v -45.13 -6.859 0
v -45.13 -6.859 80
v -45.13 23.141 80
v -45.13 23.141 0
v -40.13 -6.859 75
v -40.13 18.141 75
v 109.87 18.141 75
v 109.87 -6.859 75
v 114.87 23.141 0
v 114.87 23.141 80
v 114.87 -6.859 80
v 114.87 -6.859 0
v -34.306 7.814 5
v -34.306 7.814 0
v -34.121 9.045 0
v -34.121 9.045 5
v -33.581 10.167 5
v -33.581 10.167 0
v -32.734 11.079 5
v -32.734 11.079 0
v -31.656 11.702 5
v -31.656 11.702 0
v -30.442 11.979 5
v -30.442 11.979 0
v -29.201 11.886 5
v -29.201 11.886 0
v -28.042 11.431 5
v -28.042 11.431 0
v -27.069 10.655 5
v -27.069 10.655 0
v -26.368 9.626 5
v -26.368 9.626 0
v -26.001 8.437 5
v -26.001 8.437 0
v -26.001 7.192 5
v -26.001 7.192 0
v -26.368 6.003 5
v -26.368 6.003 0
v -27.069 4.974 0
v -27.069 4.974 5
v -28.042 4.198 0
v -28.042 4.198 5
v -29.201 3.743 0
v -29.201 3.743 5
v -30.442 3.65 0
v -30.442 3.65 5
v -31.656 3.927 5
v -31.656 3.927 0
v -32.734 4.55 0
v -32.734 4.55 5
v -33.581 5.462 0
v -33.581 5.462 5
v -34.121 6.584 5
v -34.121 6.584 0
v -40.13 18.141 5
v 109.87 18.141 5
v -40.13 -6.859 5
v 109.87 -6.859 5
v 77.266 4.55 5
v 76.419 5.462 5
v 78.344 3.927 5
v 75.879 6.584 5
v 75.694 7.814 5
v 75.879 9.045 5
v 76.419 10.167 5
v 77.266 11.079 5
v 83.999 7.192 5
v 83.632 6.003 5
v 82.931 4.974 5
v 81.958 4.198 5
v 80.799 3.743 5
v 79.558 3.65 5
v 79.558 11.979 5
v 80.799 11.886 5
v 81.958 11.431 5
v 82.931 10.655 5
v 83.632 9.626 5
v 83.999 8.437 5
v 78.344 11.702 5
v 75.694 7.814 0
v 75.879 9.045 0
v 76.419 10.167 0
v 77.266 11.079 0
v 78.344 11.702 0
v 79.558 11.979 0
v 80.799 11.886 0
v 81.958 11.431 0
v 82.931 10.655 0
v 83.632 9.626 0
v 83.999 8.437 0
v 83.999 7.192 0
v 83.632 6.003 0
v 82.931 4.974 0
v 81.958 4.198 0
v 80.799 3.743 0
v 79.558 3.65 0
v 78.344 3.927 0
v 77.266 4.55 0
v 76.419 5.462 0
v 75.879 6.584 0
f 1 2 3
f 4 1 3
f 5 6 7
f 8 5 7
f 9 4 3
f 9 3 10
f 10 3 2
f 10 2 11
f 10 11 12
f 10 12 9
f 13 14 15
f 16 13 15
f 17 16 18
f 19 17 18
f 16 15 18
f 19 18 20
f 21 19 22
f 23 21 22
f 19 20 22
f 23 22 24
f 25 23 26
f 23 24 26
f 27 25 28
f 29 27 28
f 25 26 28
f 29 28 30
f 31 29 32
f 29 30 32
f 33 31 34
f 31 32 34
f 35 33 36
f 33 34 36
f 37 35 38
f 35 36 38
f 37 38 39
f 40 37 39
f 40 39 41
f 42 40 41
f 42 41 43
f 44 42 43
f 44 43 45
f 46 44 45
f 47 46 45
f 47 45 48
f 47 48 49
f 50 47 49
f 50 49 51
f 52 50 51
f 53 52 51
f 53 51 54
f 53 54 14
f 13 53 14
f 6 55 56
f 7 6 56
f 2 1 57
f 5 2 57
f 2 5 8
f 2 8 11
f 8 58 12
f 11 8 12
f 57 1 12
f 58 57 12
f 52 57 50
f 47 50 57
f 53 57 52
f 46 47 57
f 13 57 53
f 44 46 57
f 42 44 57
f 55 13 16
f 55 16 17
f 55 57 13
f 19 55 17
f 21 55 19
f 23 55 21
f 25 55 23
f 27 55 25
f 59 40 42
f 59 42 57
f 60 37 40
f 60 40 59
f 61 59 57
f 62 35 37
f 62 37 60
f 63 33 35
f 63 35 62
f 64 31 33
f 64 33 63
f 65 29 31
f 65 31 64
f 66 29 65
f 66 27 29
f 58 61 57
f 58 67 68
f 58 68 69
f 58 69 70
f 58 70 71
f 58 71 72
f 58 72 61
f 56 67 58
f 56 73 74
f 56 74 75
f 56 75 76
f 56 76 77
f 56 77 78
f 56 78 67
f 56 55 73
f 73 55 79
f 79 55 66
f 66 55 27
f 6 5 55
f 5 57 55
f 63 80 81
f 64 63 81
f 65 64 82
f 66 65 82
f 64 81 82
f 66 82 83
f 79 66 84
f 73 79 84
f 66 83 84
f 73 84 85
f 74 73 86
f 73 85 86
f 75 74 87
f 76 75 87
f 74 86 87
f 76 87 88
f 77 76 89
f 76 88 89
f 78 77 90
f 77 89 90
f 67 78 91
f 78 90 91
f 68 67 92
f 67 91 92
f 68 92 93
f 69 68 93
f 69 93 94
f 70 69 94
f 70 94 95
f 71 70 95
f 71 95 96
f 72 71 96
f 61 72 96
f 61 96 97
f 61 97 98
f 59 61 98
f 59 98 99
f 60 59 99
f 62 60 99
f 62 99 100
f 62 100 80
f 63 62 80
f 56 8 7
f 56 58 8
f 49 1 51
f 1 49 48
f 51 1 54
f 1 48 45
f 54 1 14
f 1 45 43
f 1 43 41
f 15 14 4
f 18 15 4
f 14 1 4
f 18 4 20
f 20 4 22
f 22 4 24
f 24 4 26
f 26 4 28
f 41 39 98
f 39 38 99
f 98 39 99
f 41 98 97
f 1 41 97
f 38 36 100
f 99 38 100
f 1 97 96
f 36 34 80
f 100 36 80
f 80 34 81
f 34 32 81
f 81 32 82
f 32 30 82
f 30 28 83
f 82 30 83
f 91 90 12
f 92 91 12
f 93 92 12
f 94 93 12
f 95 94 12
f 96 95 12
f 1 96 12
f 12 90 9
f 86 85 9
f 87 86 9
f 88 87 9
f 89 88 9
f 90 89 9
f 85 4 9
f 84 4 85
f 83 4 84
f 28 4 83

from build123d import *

# Parameters (mm, degrees)
SKETCH1_W           = 160
SKETCH1_H           = 30
BOSS_EXTRUDE1_DEPTH = 80
SHELL1_T            = -5
SKETCH2_R           = 4.17592015
CUT_EXTRUDE1_DEPTH  = 15
LPATTERN1_COUNT     = 4
LPATTERN1_PITCH     = 110


with BuildPart() as part:
    # Sketch1 → Boss-Extrude1 (new body)
    with BuildSketch(Plane.XY):
        with Locations((34.869684499, 8.141289438)):
            Rectangle(SKETCH1_W, SKETCH1_H)
    extrude(amount=BOSS_EXTRUDE1_DEPTH)

    # Shell1
    shell1_openings = [part.faces().sort_by_distance(p)[0] for p in [
        (34.869684499, -6.858710562, 40),
    ]]
    offset(amount=SHELL1_T, openings=shell1_openings, kind=Kind.INTERSECTION)

    # Sketch2 → Cut-Extrude1 (cut)
    with BuildSketch(Plane(origin=(0, 0, 0), x_dir=(-1, 0, 0), z_dir=(0, 0, -1))):
        with Locations((30.130315501, 7.814471991)):
            Circle(SKETCH2_R)
    cut_extrude1 = extrude(amount=-CUT_EXTRUDE1_DEPTH, mode=Mode.SUBTRACT)

    # LPattern1: Cut-Extrude1 ×4
    with Locations(*[(i * LPATTERN1_PITCH, 0, 0) for i in range(1, LPATTERN1_COUNT)]):
        add(cut_extrude1, mode=Mode.SUBTRACT)


solid = part.part
